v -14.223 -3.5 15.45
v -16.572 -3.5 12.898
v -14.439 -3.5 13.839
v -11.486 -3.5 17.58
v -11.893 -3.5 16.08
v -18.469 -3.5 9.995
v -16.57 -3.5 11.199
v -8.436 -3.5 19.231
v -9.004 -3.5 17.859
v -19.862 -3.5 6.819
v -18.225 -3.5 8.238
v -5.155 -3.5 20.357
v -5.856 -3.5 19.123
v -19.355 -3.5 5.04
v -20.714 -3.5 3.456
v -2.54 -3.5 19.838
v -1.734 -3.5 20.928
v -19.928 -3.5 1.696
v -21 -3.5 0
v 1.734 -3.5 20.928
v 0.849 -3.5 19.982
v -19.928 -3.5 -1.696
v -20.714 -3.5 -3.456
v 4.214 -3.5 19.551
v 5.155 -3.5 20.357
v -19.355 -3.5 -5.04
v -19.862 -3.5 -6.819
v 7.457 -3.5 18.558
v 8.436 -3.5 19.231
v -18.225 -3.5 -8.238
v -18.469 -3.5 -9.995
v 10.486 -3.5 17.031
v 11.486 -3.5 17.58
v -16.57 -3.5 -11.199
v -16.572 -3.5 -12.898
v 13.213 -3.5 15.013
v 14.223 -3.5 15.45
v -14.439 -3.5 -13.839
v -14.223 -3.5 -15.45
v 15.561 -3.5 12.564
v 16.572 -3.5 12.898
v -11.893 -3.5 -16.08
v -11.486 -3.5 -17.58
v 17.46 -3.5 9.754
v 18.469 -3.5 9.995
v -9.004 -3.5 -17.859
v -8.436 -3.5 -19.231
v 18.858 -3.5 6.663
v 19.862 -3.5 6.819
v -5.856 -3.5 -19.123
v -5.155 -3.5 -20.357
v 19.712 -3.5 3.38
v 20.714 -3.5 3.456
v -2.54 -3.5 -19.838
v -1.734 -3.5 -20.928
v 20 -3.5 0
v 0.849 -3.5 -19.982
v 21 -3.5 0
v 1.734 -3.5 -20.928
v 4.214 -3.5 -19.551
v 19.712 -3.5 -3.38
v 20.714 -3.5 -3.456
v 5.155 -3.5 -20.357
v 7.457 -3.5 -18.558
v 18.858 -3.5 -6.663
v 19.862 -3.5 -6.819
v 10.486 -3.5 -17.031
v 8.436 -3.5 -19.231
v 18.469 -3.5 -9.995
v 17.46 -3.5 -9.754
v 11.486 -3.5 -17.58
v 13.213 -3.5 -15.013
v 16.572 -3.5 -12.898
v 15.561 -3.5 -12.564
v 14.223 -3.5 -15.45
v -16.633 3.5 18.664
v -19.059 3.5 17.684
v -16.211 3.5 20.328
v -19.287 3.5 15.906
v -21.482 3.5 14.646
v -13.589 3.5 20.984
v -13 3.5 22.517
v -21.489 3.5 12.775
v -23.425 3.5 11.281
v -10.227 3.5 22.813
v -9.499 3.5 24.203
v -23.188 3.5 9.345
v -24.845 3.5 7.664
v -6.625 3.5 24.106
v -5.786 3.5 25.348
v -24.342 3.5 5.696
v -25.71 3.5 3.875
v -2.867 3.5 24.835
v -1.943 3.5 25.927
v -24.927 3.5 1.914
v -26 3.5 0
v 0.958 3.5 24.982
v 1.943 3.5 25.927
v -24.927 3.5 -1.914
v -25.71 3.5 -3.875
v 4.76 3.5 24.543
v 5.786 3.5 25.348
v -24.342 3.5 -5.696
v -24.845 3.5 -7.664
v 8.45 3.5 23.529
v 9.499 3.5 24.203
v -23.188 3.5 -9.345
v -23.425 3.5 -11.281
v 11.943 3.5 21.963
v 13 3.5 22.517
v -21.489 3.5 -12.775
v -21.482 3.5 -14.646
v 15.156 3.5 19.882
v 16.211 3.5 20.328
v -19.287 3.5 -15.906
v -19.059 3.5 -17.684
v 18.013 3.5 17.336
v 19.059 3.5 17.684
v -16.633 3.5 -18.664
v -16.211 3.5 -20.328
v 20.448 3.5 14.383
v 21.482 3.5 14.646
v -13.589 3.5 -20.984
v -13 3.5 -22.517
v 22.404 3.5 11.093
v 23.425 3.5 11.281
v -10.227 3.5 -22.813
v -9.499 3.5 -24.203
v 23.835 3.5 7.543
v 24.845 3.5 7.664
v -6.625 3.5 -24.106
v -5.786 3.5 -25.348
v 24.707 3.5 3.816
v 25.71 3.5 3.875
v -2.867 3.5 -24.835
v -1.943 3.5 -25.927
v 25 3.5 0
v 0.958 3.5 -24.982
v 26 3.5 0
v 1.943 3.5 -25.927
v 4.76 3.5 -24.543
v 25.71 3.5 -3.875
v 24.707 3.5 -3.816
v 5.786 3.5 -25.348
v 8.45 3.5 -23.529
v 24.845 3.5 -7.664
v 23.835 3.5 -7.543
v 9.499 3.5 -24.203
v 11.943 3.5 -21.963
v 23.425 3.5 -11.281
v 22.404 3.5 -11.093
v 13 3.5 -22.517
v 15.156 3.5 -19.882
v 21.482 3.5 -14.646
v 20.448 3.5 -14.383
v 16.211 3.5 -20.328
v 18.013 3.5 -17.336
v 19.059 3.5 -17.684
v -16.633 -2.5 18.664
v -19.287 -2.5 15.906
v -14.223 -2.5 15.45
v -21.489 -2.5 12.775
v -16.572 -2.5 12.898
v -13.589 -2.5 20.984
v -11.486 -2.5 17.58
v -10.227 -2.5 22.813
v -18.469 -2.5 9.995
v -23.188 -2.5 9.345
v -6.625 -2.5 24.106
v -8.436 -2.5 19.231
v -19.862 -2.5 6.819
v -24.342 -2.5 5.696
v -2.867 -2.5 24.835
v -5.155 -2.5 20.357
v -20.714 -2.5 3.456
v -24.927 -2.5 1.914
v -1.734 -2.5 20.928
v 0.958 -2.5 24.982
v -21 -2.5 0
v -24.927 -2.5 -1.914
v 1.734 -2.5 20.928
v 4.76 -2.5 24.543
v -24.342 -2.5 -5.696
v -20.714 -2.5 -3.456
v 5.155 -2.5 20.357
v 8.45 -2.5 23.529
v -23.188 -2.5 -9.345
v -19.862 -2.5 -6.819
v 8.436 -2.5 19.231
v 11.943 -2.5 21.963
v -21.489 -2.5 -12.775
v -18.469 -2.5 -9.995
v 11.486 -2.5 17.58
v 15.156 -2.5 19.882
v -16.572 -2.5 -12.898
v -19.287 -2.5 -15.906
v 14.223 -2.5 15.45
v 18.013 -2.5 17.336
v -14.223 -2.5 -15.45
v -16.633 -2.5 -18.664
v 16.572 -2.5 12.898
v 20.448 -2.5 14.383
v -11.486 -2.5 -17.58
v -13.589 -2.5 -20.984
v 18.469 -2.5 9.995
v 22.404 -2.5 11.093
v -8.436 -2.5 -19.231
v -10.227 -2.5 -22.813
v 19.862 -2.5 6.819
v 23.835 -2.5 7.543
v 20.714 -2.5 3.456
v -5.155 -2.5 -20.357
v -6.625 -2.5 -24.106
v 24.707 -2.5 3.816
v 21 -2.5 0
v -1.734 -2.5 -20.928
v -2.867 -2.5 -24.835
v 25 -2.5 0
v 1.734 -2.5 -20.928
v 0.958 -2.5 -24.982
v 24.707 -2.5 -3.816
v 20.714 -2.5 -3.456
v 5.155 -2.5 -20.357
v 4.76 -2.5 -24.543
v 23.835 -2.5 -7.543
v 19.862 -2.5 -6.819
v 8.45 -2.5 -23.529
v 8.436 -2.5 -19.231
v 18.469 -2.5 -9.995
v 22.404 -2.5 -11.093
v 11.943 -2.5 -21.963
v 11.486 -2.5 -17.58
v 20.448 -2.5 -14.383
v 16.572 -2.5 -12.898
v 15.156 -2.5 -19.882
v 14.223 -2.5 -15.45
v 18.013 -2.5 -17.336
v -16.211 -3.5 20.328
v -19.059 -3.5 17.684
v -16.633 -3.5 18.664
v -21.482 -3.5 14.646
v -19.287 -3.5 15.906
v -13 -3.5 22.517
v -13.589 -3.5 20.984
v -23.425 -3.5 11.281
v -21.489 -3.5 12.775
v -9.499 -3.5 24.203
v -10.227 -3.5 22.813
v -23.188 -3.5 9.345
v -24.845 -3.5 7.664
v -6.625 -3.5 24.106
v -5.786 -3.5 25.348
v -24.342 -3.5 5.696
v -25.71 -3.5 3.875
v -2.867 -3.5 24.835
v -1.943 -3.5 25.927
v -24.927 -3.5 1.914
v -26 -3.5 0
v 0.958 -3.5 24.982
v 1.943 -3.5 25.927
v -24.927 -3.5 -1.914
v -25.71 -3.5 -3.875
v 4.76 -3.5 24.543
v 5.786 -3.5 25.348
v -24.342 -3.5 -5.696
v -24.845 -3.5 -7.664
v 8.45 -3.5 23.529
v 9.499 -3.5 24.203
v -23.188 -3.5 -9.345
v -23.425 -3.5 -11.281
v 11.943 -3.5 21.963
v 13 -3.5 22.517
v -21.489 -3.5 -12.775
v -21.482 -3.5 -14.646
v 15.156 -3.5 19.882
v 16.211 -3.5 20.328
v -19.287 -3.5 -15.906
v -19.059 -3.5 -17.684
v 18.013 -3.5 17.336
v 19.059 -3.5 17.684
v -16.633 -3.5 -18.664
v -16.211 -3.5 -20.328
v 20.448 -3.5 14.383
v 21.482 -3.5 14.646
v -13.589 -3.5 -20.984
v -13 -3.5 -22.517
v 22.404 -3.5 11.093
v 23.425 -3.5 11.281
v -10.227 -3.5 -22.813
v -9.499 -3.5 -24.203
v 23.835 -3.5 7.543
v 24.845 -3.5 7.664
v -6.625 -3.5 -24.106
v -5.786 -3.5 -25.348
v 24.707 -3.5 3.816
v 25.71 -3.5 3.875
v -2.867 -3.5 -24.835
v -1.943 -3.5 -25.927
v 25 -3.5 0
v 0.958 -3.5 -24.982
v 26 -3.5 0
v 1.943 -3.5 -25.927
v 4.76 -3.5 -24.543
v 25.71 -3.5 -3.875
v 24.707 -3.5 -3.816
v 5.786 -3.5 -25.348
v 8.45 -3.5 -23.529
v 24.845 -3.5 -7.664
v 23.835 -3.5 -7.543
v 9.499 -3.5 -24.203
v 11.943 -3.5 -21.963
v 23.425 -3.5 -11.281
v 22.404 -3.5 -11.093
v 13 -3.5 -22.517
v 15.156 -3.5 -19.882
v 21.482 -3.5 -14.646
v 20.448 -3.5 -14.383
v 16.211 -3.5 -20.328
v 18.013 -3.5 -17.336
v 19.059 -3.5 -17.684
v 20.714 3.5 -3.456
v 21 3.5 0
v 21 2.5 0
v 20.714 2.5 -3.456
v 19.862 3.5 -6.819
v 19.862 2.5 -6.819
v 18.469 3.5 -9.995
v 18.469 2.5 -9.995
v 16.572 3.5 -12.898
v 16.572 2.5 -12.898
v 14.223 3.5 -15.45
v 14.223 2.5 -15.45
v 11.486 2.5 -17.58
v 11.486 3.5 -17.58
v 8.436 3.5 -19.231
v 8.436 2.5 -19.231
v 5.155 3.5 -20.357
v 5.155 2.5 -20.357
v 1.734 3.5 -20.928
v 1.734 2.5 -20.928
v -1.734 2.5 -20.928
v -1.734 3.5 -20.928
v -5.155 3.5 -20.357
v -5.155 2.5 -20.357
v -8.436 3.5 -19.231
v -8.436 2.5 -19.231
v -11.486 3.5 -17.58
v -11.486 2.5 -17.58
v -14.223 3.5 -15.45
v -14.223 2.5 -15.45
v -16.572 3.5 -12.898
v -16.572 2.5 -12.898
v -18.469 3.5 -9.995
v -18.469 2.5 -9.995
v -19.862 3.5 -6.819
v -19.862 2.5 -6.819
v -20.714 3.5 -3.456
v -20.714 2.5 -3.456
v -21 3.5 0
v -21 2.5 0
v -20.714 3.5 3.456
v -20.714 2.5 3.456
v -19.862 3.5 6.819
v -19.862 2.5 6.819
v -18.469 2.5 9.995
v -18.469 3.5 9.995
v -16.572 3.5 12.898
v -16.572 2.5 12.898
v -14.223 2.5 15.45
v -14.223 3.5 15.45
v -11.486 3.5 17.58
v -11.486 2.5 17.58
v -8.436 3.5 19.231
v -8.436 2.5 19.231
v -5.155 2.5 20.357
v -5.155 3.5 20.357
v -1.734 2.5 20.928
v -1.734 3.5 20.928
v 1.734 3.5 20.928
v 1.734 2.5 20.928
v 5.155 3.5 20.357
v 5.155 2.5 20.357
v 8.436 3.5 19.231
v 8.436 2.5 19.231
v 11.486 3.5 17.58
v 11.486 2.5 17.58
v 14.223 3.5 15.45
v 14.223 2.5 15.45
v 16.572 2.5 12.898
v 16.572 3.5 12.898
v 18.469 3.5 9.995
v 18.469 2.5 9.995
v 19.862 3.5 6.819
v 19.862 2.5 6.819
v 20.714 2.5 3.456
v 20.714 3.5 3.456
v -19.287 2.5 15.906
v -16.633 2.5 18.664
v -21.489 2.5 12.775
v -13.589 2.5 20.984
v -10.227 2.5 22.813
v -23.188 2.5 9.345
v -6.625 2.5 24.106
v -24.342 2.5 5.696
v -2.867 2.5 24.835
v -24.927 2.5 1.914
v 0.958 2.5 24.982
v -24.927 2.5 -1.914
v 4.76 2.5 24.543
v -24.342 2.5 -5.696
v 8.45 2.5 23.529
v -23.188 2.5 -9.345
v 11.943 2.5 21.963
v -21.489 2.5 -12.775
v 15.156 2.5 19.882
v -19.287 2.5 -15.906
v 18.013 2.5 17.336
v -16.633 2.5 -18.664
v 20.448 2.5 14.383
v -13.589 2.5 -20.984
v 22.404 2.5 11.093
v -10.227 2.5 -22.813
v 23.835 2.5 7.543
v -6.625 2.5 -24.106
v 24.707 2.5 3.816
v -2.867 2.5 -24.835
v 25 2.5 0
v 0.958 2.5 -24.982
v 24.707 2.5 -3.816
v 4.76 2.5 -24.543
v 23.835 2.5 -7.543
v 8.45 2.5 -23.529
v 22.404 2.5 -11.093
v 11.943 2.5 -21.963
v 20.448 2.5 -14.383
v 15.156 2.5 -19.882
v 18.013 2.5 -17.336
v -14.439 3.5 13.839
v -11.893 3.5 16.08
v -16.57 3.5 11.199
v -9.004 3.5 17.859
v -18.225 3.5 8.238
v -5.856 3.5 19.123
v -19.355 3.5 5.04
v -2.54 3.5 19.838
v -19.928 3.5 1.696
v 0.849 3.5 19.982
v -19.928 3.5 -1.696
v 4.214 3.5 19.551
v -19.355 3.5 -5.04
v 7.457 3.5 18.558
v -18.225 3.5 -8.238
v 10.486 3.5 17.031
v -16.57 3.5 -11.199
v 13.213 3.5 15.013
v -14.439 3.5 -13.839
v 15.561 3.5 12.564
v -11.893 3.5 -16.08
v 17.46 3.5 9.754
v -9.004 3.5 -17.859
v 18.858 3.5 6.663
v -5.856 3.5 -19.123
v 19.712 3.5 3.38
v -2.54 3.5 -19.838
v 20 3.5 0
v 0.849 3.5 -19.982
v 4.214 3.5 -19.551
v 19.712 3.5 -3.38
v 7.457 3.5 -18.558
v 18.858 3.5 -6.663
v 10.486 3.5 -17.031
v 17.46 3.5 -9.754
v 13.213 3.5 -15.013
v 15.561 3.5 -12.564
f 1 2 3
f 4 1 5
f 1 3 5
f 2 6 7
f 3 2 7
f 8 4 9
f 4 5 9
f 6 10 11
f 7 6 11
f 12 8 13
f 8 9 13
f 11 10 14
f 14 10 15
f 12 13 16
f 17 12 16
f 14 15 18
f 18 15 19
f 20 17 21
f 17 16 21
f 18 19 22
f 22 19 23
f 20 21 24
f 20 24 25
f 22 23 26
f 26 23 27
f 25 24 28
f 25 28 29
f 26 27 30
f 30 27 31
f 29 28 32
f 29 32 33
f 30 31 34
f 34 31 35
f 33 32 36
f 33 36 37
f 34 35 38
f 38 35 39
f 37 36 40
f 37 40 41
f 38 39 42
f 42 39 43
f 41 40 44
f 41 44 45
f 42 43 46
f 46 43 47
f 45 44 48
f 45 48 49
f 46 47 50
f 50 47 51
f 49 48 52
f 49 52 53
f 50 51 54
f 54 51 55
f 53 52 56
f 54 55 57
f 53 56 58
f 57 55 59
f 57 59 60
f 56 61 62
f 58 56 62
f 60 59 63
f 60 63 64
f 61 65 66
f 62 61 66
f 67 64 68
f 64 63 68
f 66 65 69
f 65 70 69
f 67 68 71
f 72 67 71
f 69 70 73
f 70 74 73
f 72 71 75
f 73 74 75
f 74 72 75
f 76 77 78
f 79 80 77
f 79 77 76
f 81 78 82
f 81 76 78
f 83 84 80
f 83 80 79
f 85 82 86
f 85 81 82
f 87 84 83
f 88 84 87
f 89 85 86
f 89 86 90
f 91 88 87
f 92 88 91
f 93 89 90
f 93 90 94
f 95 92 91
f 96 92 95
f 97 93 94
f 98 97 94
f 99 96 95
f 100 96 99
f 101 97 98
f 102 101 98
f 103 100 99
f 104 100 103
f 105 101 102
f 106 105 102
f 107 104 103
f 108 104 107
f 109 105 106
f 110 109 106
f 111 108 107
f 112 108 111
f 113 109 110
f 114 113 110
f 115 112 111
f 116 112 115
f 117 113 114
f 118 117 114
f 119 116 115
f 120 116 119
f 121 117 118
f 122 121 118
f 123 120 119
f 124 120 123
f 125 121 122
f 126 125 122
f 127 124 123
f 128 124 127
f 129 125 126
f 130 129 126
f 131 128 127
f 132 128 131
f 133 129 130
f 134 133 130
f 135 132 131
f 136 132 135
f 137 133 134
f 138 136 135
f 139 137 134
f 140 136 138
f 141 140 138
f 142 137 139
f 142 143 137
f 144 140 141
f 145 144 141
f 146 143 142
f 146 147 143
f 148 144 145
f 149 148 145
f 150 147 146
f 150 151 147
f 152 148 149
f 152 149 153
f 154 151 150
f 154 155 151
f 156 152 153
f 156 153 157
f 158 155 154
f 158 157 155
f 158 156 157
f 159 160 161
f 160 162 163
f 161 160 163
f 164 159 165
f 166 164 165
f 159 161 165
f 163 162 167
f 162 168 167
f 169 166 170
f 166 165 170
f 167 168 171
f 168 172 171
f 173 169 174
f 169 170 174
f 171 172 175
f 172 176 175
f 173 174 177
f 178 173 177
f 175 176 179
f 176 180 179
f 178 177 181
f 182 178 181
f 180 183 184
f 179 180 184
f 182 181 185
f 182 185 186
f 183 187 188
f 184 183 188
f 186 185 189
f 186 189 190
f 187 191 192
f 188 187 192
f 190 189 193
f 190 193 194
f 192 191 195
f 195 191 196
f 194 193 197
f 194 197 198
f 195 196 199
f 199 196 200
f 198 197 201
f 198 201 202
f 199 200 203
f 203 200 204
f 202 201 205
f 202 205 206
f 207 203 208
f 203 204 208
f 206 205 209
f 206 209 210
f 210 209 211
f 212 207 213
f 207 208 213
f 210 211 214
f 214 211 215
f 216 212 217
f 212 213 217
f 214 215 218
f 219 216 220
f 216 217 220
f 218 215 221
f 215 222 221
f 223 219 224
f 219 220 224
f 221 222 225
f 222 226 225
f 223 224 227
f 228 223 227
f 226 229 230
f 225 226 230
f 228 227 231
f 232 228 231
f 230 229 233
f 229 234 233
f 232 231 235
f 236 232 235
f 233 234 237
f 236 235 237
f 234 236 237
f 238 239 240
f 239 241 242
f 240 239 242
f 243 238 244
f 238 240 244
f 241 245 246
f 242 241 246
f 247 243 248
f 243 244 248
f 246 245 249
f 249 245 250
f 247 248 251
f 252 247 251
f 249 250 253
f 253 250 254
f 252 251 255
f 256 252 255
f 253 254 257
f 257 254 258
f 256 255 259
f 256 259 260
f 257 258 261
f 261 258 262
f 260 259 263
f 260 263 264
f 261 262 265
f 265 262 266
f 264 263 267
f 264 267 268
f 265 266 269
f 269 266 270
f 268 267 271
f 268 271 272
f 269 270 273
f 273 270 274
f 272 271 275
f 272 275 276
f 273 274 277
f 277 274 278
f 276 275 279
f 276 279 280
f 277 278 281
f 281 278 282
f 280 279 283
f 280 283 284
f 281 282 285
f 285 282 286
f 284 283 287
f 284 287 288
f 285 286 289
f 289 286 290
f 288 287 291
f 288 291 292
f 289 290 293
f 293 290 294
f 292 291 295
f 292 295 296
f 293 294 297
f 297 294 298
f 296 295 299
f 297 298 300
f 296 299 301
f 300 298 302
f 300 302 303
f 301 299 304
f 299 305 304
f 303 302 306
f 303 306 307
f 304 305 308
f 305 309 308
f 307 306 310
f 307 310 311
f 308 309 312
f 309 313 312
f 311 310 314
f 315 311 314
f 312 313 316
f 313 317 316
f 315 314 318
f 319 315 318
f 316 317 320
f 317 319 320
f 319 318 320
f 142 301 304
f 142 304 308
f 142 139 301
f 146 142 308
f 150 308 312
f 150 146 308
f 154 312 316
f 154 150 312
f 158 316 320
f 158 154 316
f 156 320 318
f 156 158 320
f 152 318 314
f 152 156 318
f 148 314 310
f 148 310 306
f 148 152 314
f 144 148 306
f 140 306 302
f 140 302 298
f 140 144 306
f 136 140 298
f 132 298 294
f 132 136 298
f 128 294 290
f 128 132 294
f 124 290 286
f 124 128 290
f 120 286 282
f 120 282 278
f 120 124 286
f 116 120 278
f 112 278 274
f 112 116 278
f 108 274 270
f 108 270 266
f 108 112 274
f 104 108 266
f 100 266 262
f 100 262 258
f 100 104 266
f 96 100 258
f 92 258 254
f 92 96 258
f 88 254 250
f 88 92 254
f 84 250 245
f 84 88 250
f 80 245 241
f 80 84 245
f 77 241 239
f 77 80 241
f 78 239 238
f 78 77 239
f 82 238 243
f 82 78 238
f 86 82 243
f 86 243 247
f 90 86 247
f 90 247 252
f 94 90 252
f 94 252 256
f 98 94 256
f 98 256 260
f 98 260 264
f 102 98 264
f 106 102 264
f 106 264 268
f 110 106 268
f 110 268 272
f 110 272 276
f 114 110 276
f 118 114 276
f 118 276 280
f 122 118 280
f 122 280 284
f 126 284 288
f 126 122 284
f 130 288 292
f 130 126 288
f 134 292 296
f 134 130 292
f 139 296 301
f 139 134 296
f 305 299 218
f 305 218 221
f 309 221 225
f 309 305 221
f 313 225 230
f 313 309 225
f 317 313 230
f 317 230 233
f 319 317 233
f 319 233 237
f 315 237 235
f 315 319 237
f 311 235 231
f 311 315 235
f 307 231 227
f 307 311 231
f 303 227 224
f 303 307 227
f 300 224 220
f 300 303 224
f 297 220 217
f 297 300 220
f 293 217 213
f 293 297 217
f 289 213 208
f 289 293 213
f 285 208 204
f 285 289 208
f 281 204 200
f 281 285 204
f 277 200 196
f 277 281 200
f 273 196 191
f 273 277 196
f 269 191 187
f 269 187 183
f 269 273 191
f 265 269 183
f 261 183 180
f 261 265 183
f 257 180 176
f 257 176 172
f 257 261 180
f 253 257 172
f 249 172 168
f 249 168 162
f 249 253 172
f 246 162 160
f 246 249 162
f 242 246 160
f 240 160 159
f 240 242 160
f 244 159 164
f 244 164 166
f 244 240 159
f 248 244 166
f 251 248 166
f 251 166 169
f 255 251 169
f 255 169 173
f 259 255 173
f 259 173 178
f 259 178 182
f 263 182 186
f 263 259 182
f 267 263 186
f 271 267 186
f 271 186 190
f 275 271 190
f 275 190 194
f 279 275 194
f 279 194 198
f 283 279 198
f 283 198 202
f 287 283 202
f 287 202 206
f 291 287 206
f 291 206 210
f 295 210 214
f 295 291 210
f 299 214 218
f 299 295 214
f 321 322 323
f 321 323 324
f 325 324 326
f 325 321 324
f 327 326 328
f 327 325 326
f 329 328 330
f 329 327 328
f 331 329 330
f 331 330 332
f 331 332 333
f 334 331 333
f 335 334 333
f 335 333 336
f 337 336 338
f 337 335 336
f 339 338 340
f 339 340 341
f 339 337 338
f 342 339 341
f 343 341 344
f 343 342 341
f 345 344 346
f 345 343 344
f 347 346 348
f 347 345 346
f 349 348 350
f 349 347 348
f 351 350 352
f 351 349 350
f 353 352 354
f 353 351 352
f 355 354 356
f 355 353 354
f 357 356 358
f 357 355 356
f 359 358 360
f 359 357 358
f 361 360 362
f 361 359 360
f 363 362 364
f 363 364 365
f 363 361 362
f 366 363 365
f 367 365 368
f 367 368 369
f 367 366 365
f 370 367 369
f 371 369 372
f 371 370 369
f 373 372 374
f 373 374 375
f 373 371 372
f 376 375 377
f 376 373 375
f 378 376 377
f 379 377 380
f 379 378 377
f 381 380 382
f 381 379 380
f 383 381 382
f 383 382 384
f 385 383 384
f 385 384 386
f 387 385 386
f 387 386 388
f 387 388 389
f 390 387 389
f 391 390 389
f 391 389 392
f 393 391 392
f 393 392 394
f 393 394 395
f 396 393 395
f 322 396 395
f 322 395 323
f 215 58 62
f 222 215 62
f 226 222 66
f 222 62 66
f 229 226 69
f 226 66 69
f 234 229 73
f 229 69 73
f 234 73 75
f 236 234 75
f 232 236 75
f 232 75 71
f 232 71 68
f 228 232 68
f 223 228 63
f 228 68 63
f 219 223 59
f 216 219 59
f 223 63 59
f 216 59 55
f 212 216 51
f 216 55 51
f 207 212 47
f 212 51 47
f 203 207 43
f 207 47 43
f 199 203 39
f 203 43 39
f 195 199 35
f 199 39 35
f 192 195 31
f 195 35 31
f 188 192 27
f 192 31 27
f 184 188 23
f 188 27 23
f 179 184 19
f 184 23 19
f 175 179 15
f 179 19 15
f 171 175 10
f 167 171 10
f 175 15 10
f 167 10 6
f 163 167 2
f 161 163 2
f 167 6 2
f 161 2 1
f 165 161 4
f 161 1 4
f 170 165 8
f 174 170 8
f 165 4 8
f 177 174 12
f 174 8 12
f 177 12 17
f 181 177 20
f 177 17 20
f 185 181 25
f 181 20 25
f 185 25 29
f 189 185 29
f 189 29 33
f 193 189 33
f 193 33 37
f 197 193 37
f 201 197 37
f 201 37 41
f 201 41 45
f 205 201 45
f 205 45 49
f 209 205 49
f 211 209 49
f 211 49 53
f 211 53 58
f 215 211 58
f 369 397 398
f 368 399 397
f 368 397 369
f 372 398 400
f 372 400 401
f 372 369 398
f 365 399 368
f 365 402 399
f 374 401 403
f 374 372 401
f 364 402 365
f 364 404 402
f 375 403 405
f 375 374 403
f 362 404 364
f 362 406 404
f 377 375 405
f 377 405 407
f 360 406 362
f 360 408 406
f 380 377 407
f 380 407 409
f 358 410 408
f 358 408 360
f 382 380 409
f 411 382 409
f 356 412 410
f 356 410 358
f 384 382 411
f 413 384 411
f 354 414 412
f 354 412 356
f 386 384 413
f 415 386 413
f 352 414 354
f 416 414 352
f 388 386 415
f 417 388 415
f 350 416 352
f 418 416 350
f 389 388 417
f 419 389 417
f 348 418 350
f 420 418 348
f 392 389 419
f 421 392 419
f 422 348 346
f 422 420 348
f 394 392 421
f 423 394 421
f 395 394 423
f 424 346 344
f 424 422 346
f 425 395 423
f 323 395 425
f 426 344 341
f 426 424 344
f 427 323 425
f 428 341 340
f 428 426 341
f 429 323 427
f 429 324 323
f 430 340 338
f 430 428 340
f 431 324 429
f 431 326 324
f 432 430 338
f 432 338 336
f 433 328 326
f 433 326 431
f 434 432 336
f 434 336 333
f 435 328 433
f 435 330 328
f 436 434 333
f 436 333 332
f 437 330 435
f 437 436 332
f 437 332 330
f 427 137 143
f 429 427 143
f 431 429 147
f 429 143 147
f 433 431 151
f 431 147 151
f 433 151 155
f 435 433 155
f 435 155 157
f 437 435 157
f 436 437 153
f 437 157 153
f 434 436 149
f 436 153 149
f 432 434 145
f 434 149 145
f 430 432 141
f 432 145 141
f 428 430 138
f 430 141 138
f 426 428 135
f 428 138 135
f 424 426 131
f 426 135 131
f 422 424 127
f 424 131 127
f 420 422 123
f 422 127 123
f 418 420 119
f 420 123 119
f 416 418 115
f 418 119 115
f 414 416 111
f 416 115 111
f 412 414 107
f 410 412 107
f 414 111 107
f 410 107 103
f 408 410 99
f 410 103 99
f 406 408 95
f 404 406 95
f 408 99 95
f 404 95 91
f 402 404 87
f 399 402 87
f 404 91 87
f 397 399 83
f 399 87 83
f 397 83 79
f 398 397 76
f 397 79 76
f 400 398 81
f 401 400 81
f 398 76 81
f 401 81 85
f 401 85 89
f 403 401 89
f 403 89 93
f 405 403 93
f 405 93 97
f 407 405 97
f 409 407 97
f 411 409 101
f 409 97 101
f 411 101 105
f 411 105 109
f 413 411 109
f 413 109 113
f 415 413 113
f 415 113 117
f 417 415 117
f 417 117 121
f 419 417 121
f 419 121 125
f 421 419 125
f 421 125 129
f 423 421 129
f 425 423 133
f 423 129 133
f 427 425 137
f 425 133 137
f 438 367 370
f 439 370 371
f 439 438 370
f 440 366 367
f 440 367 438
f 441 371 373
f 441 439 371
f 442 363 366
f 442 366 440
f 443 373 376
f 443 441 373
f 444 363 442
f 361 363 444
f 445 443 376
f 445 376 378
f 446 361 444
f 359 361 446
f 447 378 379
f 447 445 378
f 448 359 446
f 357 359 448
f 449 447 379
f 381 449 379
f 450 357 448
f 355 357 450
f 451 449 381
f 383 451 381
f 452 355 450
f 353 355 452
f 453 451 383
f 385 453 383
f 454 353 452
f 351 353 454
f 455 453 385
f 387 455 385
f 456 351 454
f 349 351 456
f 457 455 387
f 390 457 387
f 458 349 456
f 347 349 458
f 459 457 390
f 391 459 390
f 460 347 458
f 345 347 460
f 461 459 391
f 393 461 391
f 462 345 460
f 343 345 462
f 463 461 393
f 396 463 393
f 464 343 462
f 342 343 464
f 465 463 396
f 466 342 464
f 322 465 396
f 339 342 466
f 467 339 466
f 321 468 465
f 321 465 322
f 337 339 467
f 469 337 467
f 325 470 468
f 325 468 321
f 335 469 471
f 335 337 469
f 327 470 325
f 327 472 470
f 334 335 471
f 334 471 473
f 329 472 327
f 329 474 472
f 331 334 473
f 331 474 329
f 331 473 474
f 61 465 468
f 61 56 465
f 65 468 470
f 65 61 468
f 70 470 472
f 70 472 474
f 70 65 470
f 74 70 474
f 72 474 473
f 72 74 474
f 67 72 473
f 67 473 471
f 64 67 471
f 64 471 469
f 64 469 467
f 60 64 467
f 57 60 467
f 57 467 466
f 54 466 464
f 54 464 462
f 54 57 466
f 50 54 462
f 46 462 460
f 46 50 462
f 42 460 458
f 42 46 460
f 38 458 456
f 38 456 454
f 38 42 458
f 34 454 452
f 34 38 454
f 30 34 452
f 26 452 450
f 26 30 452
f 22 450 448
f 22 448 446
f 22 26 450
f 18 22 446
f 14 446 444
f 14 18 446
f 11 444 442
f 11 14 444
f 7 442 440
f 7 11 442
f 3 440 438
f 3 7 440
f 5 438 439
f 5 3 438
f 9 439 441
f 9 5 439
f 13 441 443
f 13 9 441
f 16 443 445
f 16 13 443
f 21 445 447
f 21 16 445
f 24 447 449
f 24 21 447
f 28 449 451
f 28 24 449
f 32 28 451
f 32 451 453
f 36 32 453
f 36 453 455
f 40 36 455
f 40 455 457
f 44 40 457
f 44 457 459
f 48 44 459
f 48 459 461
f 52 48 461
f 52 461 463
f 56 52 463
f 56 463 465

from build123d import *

# Parameters (mm, degrees)
CROQUIS1_R              = 26
CROQUIS1_R_2            = 20
SALIENTE_EXTRUIR1_DEPTH = 3.5
CROQUIS2_R              = 25
CROQUIS2_R_2            = 21
CORTAR_EXTRUIR1_DEPTH   = 1


with BuildPart() as part:
    # Croquis1 → Saliente-Extruir1 (new body, symmetric)
    with BuildSketch(Plane(origin=(0, 0, 0), x_dir=(1, 0, 0), z_dir=(0, 1, 0))):
        Circle(CROQUIS1_R)
        Circle(CROQUIS1_R_2, mode=Mode.SUBTRACT)
    extrude(amount=SALIENTE_EXTRUIR1_DEPTH, both=True)

    # Croquis2 → Cortar-Extruir1 (cut)
    with BuildSketch(Plane(origin=(0, 3.5, 0), x_dir=(1, 0, 0), z_dir=(0, 1, 0))):
        Circle(CROQUIS2_R)
        Circle(CROQUIS2_R_2, mode=Mode.SUBTRACT)
    cortar_extruir1 = extrude(amount=-CORTAR_EXTRUIR1_DEPTH, mode=Mode.SUBTRACT)

    # Simetría1: Cortar-Extruir1 across plane
    add(cortar_extruir1.mirror(Plane.ZX), mode=Mode.SUBTRACT)


solid = part.part
